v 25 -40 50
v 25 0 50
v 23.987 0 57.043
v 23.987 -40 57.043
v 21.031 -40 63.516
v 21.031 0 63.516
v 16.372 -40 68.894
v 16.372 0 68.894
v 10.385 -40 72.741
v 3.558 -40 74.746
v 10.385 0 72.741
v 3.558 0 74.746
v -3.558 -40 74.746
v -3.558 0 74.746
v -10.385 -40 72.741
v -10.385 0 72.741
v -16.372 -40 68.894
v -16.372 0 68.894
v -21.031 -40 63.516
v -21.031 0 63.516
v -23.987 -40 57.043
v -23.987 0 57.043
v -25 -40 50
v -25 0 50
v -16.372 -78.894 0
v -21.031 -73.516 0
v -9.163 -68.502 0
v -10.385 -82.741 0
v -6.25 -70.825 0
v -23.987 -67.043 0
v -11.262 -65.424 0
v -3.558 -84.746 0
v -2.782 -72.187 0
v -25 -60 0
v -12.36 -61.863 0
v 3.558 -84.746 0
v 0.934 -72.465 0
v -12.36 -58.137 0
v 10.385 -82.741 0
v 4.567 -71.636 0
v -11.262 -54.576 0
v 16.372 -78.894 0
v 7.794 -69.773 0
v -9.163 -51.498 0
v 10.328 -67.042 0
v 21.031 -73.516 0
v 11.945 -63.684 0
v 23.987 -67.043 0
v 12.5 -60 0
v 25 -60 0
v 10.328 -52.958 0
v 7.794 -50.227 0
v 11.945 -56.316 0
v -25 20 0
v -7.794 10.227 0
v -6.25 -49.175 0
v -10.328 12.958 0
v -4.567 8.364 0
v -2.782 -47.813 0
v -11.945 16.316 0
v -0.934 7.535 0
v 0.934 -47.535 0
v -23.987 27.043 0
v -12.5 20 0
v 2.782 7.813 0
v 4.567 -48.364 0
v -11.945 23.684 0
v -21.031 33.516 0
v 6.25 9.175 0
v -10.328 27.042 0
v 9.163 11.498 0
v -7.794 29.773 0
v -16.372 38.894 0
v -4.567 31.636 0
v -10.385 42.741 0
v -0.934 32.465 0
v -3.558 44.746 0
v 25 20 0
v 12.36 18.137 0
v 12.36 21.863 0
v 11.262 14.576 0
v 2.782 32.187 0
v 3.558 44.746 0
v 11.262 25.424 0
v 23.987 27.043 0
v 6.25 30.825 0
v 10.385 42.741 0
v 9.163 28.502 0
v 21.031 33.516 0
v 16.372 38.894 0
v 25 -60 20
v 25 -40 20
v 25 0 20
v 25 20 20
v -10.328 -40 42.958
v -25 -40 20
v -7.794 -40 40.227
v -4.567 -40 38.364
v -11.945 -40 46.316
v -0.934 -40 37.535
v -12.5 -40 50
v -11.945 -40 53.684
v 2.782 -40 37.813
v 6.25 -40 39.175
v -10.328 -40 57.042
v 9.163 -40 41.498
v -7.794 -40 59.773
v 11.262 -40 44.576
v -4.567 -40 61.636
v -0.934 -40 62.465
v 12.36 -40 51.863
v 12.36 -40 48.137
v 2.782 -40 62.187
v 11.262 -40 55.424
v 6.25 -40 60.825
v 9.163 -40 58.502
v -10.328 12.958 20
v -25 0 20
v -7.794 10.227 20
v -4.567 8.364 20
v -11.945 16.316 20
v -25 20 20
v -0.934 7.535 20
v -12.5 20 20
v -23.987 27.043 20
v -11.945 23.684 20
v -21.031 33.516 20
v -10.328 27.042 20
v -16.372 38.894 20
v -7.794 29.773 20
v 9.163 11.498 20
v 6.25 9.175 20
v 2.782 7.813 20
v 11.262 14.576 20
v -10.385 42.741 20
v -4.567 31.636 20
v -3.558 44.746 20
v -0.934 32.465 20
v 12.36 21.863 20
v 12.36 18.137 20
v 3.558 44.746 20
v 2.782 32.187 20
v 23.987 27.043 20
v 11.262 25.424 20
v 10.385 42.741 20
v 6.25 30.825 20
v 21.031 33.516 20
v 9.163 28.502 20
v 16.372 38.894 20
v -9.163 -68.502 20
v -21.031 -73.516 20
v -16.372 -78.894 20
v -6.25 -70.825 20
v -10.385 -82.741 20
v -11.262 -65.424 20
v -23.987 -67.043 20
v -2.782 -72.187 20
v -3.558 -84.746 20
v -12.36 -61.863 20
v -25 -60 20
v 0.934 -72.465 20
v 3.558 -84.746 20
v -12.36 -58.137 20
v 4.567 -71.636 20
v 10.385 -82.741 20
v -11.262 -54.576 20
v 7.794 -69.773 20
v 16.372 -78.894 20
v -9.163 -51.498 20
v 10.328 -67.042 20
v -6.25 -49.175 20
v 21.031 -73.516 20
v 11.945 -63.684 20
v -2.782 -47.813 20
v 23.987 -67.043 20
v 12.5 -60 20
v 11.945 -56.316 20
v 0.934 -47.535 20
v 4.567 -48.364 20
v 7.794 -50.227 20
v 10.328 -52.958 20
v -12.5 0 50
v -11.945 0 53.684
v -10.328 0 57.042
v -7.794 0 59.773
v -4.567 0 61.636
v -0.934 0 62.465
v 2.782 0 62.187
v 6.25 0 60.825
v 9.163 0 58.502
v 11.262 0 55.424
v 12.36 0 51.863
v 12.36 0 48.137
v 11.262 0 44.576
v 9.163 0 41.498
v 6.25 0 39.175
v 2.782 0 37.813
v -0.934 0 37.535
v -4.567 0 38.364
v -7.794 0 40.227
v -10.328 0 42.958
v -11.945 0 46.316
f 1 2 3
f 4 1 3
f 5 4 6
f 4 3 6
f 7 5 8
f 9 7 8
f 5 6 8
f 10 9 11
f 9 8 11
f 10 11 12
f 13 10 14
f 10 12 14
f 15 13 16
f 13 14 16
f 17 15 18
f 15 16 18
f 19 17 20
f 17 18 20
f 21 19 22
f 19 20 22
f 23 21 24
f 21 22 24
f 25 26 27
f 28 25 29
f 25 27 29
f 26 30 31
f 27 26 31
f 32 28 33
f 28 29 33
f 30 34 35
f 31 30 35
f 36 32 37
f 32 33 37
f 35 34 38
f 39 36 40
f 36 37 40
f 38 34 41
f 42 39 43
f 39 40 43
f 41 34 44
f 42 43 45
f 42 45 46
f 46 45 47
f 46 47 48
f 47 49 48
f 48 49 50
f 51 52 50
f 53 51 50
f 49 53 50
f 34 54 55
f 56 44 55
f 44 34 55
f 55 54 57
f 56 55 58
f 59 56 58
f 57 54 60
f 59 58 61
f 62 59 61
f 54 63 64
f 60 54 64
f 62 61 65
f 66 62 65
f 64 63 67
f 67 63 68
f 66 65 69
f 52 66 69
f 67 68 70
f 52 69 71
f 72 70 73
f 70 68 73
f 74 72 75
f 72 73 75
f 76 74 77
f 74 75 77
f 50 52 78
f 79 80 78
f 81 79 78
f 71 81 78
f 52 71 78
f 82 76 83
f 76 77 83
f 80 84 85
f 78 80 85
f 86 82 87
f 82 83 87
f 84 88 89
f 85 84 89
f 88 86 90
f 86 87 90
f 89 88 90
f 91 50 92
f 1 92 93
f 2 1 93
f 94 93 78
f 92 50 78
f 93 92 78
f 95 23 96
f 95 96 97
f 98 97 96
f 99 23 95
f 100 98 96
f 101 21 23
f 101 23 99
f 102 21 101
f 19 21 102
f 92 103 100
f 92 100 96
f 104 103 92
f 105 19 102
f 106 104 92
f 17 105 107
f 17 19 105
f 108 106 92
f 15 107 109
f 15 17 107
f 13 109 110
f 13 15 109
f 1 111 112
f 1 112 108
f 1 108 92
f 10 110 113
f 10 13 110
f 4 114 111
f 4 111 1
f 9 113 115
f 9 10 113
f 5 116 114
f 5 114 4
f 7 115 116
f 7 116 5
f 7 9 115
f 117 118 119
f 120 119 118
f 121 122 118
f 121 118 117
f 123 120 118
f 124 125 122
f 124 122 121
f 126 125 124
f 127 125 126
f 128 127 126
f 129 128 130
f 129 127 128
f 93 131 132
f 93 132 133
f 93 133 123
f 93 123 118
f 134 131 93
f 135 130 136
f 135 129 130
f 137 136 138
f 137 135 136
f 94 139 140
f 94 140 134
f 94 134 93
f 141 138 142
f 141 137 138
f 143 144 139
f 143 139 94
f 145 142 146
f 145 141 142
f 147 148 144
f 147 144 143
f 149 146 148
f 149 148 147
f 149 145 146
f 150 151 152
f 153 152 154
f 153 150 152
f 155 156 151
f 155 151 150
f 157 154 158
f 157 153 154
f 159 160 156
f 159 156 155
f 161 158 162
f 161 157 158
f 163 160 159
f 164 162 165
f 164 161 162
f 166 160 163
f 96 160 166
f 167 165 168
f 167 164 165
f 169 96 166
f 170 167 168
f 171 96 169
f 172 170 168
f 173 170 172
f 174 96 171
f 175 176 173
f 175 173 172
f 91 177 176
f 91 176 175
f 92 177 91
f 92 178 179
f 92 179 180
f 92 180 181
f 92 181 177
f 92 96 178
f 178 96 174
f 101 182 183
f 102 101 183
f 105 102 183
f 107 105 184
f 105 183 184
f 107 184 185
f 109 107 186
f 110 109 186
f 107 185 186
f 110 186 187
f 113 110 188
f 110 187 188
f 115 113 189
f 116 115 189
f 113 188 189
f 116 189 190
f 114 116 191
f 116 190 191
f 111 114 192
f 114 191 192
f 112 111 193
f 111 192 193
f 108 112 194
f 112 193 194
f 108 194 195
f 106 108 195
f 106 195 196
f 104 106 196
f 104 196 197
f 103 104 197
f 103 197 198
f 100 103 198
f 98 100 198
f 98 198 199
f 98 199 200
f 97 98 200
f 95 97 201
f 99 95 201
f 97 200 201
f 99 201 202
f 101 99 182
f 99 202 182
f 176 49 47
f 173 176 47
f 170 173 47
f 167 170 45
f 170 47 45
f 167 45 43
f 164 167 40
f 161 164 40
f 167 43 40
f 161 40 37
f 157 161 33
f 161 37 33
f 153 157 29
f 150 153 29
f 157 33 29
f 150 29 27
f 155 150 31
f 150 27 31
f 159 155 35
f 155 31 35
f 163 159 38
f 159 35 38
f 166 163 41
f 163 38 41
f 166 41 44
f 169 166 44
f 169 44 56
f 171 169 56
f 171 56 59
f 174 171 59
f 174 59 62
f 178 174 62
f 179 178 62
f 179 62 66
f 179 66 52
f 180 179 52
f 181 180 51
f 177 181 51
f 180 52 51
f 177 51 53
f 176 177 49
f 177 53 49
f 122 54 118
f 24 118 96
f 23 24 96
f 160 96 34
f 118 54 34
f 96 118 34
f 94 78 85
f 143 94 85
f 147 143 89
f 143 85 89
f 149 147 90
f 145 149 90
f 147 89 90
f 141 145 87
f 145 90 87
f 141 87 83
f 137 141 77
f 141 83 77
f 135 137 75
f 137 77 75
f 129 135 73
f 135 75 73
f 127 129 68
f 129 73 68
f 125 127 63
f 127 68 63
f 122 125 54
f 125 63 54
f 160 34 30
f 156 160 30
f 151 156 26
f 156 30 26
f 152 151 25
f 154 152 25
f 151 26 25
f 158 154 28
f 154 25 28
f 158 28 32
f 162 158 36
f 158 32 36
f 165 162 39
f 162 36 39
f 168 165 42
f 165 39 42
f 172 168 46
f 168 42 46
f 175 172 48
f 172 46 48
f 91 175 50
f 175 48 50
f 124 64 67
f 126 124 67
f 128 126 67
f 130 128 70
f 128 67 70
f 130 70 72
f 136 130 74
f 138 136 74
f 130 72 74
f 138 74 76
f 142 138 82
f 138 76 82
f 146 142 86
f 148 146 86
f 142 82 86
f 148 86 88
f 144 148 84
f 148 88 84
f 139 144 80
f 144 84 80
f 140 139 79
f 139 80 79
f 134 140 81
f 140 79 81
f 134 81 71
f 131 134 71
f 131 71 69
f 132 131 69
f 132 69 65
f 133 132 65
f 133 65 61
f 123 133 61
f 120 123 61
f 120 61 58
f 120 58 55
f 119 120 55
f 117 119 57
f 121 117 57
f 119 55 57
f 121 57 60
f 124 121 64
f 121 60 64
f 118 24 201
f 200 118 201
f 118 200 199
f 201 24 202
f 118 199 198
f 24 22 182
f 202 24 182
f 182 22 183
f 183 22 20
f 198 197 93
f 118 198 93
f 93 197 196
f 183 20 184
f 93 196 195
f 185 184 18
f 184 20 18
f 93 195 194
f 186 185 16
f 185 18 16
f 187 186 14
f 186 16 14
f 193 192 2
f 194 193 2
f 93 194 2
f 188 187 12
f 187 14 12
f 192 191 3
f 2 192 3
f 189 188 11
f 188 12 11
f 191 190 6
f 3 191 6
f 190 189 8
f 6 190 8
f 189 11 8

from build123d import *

# Parameters (mm, degrees)
F1_DEPTH = 40
F2_W     = 50
F2_H     = 40
F3_DEPTH = 20


with BuildPart() as f1:
    # F0 (on Front) → F1 (new body)
    with BuildSketch(Plane.XZ):
        with BuildLine():
            Line((25, 0), (25, 50))
            Line((25, 50), (12.5, 50))
            ThreePointArc((12.5, 50), (0, 37.5), (-12.5, 50))
            Line((-12.5, 50), (-25, 50))
            Line((-25, 50), (-25, 0))
            Line((-25, 0), (25, 0))
        make_face()
        with BuildLine():
            Line((12.5, 50), (25, 50))
            ThreePointArc((25, 50), (0, 75), (-25, 50))
            Line((-25, 50), (-12.5, 50))
            ThreePointArc((-12.5, 50), (0, 62.5), (12.5, 50))
        make_face()
    extrude(amount=F1_DEPTH)

    # F2 (on Top) → F3 (join)
    with BuildSketch(Plane.XY):
        with BuildLine():
            Line((-25, 20), (-25, 0))
            Line((-25, 0), (25, 0))
            Line((25, 0), (25, 20))
            Line((25, 20), (12.5, 20))
            ThreePointArc((12.5, 20), (0, 7.5), (-12.5, 20))
            Line((-12.5, 20), (-25, 20))
        make_face()
        with Locations((0, -20)):
            Rectangle(F2_W, F2_H)
        with BuildLine():
            ThreePointArc((25, 20), (0, 45), (-25, 20))
            Line((-25, 20), (-12.5, 20))
            ThreePointArc((-12.5, 20), (0, 32.5), (12.5, 20))
            Line((12.5, 20), (25, 20))
        make_face()
        with BuildLine():
            Line((25, -40), (-25, -40))
            Line((-25, -40), (-25, -60))
            Line((-25, -60), (-12.5, -60))
            ThreePointArc((-12.5, -60), (0, -47.5), (12.5, -60))
            Line((12.5, -60), (25, -60))
            Line((25, -60), (25, -40))
        make_face()
        with BuildLine():
            Line((-12.5, -60), (-25, -60))
            ThreePointArc((-25, -60), (0, -85), (25, -60))
            Line((25, -60), (12.5, -60))
            ThreePointArc((12.5, -60), (0, -72.5), (-12.5, -60))
        make_face()
    extrude(amount=F3_DEPTH)


solid = f1.part
